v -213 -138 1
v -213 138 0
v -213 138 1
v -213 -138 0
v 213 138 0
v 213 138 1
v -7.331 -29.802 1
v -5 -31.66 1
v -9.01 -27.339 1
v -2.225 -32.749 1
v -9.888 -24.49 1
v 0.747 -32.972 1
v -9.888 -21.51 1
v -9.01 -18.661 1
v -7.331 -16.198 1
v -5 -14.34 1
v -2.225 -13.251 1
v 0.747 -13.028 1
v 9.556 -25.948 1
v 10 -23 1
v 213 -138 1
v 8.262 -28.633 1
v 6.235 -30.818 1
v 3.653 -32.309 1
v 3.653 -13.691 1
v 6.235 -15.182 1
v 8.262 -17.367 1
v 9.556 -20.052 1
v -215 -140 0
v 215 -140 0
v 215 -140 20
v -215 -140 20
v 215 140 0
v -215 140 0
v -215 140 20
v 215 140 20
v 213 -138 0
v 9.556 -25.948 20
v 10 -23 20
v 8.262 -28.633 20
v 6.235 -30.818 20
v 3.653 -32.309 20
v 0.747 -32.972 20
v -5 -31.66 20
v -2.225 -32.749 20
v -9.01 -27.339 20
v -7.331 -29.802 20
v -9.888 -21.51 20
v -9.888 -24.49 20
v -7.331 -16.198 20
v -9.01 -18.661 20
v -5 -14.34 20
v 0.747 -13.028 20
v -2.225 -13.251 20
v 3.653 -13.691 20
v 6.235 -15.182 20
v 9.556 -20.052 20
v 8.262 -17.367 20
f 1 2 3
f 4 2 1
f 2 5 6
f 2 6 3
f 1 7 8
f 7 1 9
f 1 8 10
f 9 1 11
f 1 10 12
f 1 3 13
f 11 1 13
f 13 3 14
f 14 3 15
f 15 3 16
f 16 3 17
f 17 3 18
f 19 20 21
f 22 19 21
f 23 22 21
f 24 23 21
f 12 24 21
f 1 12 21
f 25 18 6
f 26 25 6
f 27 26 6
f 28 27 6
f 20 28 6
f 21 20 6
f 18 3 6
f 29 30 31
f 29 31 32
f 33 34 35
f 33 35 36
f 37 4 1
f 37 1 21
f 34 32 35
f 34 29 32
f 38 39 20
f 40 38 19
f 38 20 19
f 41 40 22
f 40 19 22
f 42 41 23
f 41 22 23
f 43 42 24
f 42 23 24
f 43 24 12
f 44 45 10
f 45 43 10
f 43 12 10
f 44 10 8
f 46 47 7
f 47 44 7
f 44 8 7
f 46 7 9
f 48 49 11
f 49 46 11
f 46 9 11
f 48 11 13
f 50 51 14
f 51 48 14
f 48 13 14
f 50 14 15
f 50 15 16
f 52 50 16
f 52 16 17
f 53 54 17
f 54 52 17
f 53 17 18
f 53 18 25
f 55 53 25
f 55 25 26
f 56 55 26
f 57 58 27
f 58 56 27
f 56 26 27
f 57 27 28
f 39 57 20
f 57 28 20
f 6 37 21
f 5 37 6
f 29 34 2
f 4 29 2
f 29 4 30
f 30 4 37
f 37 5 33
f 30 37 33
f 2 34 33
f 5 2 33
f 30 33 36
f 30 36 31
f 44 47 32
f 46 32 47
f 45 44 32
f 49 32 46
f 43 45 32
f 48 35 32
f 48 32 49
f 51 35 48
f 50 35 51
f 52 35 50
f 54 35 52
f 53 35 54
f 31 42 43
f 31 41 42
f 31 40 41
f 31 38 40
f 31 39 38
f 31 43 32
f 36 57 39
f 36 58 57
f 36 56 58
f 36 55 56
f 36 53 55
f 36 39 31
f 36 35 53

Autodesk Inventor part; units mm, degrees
ref_plane "YZ Plane" through (0, 0, 0) normal (1, 0, 0) x (0, 1, 0)
ref_plane "XZ Plane" through (0, 0, 0) normal (0, 1, 0) x (-1, 0, 0)
ref_plane "XY Plane" through (0, 0, 0) normal (0, 0, 1) x (1, 0, 0)
sketch "Sketch1" plane through (0, 0, 0) normal (0, 0, 1) x (1, 0, 0)
  line L0 (-215, 140) -> (215, 140)
  line L1 (215, 140) -> (215, -140)
  line L2 (215, -140) -> (-215, -140)
  line L3 (-215, -140) -> (-215, 140)
  line L4 (-215, 140) -> (215, -140) construction
  line L5 (215, 140) -> (-215, -140) construction
  line L6 (0, 0) -> (0, -23) construction
  circle A0 centre (0, -23) radius 10
  dimension "d0" = 430
  dimension "d1" = 280
  dimension "d2" = 23
  dimension "d3" = 20
extrude "Extrusion1" add sketch "Sketch1" along normal blind 20
sketch "Sketch2" plane through (0, 0, 0) normal (0, 0, -1) x (-1, 0, 0)
  line L0 (215, -140) -> (-215, -140) projected
  line L1 (215, 140) -> (215, -140) projected
  line L2 (-215, 140) -> (215, 140) projected
  line L3 (-215, -140) -> (-215, 140) projected
  circle A0 centre (0, -23) radius 10 projected
  line L4 (213, 138) -> (213, -138)
  line L5 (213, -138) -> (-213, -138)
  line L6 (-213, -138) -> (-213, 138)
  line L7 (-213, 138) -> (213, 138)
  point P0 (0, 0)
  dimension "d6" = 2
emboss "Emboss1" sketch "Sketch2" operation cut depth 1 direction (0, 0, 1) contours L4 L5 L6 L7
properties part number "SoporteBaseElevacion"
